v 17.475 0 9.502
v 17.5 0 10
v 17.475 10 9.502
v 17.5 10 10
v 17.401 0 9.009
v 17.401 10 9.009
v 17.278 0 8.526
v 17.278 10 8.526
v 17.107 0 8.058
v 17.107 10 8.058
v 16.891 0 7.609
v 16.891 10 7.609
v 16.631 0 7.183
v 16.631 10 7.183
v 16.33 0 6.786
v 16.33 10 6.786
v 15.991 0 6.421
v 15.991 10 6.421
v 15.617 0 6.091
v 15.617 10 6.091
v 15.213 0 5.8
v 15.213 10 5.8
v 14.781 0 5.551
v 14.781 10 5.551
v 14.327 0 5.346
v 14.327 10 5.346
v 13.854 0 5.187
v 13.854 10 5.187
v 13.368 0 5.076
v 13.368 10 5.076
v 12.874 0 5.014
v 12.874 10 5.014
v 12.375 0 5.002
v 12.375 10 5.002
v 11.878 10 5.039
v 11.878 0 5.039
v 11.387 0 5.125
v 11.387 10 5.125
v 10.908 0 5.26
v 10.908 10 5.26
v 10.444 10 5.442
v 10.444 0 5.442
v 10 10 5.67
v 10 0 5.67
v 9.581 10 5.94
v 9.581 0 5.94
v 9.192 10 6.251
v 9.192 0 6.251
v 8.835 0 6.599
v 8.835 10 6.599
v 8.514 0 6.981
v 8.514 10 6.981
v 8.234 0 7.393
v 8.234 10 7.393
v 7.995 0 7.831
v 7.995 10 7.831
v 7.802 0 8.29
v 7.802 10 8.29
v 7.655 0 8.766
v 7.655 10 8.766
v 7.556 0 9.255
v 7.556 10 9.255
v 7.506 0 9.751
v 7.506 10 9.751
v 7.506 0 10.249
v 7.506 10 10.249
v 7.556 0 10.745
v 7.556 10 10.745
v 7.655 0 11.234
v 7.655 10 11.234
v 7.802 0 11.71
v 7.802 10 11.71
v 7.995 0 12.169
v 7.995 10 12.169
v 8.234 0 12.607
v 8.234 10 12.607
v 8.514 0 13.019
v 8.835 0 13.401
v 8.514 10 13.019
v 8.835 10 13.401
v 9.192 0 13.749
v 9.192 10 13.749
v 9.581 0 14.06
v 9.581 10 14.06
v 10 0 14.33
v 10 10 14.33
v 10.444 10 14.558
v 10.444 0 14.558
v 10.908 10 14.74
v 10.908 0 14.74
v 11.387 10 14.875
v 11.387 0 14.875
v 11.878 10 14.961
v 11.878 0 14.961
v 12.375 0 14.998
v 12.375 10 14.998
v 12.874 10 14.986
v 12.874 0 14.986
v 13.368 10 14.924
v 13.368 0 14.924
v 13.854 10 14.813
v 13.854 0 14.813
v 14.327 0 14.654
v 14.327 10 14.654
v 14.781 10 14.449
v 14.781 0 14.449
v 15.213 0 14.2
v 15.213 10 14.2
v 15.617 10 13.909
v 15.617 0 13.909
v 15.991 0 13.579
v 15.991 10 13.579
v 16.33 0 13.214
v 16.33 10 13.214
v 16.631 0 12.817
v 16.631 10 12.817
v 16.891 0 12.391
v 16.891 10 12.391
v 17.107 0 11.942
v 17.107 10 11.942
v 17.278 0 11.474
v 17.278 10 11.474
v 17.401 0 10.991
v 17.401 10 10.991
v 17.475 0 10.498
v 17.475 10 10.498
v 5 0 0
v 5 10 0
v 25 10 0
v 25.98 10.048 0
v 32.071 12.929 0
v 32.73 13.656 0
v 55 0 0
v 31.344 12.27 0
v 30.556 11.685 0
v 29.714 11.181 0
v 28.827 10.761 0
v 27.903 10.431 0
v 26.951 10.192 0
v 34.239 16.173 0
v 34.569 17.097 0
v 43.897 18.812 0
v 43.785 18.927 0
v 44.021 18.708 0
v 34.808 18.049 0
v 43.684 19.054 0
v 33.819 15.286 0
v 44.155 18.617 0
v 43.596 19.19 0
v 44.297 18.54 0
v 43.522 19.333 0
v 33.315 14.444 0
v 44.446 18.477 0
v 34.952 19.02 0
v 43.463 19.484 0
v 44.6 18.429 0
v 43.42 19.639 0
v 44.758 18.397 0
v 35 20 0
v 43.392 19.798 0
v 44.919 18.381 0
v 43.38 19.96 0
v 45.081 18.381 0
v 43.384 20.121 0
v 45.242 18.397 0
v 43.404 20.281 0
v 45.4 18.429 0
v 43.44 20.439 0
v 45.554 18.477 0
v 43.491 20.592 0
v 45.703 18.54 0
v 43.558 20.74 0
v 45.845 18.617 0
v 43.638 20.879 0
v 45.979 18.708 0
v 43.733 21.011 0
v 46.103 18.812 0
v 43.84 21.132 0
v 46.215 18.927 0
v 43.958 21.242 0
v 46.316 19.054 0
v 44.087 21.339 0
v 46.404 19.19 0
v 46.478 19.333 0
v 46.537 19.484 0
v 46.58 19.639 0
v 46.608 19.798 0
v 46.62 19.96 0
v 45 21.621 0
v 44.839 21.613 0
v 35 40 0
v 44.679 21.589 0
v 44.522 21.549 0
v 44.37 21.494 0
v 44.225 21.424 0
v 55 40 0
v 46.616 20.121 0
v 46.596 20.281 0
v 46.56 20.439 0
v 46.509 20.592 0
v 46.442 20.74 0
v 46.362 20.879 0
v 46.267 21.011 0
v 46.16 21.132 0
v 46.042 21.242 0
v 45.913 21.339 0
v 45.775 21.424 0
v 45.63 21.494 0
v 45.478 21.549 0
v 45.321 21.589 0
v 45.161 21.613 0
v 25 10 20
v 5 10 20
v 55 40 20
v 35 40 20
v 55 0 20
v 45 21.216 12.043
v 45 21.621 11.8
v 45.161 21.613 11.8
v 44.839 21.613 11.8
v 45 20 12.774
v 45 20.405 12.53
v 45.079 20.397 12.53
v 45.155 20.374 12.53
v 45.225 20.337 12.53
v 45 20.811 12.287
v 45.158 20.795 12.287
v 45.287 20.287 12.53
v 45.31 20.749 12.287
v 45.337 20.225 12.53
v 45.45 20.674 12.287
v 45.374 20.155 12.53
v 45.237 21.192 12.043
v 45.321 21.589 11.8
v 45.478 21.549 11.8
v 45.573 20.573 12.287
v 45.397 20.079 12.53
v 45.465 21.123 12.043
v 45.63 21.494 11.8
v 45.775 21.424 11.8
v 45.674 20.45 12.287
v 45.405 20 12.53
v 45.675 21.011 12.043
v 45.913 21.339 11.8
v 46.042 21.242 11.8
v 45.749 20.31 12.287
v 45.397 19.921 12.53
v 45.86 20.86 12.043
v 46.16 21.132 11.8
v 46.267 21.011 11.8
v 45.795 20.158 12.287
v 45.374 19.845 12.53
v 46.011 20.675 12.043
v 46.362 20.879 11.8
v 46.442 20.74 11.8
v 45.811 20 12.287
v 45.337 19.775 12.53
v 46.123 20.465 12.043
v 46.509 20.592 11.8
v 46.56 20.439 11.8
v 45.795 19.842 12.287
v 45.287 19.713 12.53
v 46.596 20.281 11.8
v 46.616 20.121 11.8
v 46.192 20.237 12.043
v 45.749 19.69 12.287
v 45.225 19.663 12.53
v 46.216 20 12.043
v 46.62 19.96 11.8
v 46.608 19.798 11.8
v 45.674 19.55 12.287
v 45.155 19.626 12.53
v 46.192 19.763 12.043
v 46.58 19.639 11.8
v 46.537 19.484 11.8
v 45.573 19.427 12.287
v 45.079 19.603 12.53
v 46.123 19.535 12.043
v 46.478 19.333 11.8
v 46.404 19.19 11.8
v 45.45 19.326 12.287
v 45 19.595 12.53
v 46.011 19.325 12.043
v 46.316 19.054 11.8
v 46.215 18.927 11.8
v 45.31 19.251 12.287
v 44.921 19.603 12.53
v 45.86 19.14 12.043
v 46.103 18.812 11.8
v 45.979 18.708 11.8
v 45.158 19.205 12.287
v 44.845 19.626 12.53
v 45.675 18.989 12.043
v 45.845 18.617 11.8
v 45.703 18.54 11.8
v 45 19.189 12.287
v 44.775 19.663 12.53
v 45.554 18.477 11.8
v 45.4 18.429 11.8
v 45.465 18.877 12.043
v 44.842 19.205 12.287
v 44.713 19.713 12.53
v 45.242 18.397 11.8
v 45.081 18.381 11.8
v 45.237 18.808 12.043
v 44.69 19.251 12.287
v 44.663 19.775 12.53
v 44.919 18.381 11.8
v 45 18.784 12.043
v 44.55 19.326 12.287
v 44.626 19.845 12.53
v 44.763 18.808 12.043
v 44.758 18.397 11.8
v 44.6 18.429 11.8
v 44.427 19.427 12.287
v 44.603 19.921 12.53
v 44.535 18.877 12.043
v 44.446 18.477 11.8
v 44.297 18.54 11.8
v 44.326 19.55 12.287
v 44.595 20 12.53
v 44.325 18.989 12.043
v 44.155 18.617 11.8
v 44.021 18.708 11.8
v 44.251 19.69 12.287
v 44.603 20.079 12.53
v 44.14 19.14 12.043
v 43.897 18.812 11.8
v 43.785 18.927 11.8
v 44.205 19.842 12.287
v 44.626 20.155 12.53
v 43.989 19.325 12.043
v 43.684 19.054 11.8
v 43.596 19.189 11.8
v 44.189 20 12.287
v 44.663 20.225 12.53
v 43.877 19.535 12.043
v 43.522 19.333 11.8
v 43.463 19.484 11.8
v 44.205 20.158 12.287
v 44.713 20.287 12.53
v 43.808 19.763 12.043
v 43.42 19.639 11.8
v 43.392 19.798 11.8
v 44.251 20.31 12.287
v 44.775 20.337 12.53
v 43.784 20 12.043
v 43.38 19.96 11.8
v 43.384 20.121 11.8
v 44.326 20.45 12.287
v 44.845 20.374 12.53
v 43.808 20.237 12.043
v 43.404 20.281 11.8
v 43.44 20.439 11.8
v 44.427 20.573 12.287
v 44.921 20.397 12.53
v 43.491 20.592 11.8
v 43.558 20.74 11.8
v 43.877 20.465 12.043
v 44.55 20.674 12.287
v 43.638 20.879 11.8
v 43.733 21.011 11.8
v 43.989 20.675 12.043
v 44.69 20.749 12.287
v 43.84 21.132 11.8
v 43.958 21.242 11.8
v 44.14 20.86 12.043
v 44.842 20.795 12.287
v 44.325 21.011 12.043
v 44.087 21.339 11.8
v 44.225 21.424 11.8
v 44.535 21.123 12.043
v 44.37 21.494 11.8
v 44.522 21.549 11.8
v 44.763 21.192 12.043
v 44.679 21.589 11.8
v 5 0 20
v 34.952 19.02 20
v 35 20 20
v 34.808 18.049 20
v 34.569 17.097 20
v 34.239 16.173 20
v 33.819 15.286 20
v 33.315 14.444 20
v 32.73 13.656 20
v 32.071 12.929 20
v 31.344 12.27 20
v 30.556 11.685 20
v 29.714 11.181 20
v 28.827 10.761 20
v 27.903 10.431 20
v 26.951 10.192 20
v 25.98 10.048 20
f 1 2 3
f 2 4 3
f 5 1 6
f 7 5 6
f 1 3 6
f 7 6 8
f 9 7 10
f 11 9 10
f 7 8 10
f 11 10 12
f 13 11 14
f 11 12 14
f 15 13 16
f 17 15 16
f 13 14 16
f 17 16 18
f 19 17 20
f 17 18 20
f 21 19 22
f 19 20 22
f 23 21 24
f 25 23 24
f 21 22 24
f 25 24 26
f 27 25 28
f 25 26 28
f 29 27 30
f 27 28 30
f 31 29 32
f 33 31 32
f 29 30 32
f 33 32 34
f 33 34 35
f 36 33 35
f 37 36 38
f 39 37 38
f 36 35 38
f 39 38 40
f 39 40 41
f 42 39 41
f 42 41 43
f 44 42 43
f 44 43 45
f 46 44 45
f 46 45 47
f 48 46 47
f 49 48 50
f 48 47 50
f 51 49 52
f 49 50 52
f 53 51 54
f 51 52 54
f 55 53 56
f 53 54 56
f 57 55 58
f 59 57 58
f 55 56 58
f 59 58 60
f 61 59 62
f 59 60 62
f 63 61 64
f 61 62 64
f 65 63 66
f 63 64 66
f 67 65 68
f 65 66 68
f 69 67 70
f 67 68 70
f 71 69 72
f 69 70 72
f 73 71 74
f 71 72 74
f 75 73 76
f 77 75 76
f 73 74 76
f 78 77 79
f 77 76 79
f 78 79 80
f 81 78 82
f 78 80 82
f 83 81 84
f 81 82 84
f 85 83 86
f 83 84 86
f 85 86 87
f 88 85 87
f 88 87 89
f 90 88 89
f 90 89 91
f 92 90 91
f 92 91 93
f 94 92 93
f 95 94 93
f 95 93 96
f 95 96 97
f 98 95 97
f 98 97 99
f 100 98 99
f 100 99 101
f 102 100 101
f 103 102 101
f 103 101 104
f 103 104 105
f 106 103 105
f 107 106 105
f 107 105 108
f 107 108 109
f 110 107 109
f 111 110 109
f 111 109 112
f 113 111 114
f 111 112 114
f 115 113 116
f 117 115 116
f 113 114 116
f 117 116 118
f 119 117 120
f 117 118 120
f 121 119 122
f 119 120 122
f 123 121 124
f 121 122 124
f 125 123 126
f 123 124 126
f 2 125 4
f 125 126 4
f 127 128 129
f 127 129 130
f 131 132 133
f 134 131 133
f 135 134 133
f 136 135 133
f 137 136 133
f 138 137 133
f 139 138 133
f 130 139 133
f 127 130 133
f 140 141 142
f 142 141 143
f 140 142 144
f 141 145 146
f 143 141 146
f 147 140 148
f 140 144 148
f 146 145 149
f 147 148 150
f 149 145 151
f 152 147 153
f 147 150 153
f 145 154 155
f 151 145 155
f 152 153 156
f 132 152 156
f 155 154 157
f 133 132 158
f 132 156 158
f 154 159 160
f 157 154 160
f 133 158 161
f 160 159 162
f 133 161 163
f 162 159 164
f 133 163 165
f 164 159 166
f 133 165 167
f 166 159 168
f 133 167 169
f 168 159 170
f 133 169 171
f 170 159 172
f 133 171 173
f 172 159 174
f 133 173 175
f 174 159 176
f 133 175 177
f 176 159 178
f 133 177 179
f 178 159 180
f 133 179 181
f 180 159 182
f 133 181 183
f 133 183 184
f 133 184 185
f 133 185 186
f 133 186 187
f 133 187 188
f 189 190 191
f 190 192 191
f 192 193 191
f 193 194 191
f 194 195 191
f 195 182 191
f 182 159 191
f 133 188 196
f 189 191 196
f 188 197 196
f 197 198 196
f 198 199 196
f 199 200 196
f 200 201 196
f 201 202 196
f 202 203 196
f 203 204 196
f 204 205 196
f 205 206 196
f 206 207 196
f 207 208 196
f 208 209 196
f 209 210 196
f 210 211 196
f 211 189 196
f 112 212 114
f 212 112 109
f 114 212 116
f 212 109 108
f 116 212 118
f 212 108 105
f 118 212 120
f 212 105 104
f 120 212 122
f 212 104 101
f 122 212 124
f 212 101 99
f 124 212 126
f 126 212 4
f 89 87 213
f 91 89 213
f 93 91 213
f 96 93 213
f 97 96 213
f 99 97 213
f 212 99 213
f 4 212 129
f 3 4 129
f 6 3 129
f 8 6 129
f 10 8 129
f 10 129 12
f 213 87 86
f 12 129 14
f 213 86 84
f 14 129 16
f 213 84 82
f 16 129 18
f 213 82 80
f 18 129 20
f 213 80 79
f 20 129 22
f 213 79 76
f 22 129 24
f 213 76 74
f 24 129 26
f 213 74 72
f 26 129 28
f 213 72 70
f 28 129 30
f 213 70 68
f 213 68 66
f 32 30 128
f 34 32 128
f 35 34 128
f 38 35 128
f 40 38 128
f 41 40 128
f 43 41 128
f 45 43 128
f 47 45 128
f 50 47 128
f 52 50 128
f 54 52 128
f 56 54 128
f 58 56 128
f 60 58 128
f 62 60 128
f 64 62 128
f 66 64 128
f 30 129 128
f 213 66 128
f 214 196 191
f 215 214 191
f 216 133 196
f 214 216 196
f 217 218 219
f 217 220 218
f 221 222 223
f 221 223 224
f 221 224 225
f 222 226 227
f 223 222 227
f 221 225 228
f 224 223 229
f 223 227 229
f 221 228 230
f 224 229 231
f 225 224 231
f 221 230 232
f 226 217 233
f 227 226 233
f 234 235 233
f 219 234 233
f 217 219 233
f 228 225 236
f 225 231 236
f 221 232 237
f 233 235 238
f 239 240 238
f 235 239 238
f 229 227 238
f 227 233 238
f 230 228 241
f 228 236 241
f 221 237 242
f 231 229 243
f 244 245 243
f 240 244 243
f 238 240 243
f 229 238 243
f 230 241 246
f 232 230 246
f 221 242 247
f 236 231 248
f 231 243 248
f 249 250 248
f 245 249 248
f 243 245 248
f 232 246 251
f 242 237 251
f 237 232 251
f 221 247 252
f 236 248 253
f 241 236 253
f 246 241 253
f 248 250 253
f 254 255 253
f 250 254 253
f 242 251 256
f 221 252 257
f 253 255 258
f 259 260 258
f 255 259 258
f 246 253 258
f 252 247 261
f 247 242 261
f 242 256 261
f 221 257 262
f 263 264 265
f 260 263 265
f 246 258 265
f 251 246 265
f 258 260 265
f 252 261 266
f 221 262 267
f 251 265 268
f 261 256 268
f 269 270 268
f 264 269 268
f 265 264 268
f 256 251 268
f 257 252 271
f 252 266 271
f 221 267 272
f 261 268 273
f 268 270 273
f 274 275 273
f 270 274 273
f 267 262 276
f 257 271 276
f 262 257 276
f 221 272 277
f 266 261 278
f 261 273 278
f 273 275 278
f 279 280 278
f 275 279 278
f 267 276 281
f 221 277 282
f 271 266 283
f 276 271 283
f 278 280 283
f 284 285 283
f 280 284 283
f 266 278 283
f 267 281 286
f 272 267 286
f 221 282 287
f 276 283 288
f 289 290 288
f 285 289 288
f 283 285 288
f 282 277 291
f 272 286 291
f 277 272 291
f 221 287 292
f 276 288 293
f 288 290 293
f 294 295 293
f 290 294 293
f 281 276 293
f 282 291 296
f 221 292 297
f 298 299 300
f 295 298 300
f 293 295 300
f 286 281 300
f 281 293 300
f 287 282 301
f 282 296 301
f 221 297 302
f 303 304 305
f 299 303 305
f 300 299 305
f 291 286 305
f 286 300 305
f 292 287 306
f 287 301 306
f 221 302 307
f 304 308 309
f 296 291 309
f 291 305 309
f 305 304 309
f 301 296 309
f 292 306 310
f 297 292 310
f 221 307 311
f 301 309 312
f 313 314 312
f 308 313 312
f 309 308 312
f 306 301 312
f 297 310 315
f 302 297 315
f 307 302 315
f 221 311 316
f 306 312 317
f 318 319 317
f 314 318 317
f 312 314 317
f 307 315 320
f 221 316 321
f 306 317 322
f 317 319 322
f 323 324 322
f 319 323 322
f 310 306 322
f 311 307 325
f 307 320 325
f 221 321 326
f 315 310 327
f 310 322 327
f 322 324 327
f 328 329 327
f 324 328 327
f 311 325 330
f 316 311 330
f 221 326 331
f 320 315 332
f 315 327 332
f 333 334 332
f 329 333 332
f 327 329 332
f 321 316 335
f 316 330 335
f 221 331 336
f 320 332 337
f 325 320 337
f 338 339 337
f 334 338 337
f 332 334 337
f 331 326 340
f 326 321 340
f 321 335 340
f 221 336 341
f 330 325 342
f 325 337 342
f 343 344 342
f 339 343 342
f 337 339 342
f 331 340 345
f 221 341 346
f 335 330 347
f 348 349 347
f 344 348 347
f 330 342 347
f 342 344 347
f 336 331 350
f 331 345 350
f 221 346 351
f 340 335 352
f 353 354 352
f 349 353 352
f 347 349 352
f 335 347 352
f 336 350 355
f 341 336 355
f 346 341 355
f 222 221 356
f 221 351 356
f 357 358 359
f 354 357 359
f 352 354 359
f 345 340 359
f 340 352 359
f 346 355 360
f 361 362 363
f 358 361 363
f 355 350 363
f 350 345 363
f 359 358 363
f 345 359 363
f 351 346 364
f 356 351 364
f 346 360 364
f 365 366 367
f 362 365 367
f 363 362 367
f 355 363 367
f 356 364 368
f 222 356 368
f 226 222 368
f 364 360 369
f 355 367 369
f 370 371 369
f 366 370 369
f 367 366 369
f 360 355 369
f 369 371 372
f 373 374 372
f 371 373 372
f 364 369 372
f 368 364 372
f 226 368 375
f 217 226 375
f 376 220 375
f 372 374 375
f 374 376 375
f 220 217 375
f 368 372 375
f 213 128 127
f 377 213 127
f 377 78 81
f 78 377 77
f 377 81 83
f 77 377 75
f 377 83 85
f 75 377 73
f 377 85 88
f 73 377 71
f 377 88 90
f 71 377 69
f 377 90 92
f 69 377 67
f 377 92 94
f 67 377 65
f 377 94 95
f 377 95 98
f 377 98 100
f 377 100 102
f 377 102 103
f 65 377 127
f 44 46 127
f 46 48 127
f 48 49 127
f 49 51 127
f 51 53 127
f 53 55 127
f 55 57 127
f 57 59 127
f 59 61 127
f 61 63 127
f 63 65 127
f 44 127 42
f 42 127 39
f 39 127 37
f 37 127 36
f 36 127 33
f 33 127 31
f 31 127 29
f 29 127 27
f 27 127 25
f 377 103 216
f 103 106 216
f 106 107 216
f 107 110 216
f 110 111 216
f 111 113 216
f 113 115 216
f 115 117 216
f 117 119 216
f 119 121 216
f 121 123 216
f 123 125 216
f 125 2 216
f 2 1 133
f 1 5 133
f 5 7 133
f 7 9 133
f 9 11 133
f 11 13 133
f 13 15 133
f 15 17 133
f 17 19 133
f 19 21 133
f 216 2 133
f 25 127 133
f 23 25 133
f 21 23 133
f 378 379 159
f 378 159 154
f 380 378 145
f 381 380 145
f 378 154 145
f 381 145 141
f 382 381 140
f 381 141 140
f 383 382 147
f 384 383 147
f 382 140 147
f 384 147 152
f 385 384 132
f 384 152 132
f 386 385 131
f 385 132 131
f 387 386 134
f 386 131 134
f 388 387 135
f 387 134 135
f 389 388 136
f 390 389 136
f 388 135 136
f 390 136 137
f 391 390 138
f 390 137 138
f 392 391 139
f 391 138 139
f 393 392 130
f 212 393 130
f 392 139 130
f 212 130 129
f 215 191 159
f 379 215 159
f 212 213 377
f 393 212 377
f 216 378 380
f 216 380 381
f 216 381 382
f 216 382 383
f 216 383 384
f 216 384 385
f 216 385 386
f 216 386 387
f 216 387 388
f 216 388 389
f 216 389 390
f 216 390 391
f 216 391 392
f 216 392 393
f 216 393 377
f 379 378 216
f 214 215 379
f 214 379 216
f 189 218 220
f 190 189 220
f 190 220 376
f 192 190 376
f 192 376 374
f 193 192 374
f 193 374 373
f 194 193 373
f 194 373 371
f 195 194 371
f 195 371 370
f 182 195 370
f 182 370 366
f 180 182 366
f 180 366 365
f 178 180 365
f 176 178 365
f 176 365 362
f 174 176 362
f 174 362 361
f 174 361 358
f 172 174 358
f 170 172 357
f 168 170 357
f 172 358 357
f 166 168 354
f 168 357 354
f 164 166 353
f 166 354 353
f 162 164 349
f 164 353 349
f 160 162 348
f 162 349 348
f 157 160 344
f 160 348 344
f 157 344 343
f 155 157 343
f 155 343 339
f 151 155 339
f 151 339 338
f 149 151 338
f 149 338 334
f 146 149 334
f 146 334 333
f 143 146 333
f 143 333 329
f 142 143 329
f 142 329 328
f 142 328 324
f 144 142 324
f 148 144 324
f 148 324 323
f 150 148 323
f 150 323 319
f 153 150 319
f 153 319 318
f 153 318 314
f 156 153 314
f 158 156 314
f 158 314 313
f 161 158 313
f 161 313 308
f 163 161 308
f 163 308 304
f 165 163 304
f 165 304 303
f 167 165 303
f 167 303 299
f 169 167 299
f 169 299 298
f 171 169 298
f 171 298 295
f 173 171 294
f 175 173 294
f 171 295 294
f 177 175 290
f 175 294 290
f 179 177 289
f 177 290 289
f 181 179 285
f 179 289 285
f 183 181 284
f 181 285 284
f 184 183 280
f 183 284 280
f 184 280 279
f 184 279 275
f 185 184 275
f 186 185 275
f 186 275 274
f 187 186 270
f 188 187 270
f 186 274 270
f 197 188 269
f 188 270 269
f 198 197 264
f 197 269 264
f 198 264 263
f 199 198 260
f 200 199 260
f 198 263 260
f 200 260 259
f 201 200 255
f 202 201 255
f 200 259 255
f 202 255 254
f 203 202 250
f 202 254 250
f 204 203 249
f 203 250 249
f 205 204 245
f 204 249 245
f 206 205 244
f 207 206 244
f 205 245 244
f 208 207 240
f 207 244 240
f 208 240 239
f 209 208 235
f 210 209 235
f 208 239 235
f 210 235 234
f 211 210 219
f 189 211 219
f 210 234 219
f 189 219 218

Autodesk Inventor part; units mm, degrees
ref_plane "YZ Plane" through (0, 0, 0) normal (1, 0, 0) x (0, 1, 0)
ref_plane "XZ Plane" through (0, 0, 0) normal (0, 1, 0) x (-1, 0, 0)
ref_plane "XY Plane" through (0, 0, 0) normal (0, 0, 1) x (1, 0, 0)
sketch "Bracket Short" plane through (0, 0, 0) normal (0, 0, 1) x (1, 0, 0)
  line L0 (0, 0) -> (30, 0)
  line L1 (25, 10) -> (0, 10)
  line L2 (0, 10) -> (0, 0)
  line L3 (30, 0) -> (55, 0)
  line L4 (55, 0) -> (55, 40)
  line L5 (55, 40) -> (35, 40)
  line L6 (35, 40) -> (35, 20)
  arc A0 (25, 10) -> (35, 20) centre (25, 20) ccw
  point P0 (35, 10)
  dimension "d0" = 35
  dimension "d2" = 20
  dimension "d3" = 40
  dimension "d4" = 10
  dimension "d10" = 10
extrude "Extrusion1" add sketch "Bracket Short" along normal blind 20
sketch "Clearance Hole (M6-8)" plane through (0, 10, 0) normal (0, 1, 0) x (1, 0, 0)
  circle A0 centre (12.5, -10) radius 5
  point P0 (0, 0)
  dimension "d7" = 10
extrude "Extrusion2" cut sketch "Clearance Hole (M6-8)" against normal through all
sketch "Sketch3" plane through (0, 0, 0) normal (0, 0, -1) x (-1, 0, 0)
  circle A0 centre (-45, 20) radius 2
  point P0 (0, 0)
  dimension "d15" = 4
hole "Hole1" at (45, 20, 0) direction (0, 0, 1) diameter 3.242 depth 11.8 tip angle 118 thread size "M4x0.7" class "6H" standard "ANSI Metric M Profile"
move faces "Move1" translate (5, 0, 0) faces at (0, 6.6667, 6.6667)
properties part number "Bracket_Short" material "Aluminum, Anodized Silver"
